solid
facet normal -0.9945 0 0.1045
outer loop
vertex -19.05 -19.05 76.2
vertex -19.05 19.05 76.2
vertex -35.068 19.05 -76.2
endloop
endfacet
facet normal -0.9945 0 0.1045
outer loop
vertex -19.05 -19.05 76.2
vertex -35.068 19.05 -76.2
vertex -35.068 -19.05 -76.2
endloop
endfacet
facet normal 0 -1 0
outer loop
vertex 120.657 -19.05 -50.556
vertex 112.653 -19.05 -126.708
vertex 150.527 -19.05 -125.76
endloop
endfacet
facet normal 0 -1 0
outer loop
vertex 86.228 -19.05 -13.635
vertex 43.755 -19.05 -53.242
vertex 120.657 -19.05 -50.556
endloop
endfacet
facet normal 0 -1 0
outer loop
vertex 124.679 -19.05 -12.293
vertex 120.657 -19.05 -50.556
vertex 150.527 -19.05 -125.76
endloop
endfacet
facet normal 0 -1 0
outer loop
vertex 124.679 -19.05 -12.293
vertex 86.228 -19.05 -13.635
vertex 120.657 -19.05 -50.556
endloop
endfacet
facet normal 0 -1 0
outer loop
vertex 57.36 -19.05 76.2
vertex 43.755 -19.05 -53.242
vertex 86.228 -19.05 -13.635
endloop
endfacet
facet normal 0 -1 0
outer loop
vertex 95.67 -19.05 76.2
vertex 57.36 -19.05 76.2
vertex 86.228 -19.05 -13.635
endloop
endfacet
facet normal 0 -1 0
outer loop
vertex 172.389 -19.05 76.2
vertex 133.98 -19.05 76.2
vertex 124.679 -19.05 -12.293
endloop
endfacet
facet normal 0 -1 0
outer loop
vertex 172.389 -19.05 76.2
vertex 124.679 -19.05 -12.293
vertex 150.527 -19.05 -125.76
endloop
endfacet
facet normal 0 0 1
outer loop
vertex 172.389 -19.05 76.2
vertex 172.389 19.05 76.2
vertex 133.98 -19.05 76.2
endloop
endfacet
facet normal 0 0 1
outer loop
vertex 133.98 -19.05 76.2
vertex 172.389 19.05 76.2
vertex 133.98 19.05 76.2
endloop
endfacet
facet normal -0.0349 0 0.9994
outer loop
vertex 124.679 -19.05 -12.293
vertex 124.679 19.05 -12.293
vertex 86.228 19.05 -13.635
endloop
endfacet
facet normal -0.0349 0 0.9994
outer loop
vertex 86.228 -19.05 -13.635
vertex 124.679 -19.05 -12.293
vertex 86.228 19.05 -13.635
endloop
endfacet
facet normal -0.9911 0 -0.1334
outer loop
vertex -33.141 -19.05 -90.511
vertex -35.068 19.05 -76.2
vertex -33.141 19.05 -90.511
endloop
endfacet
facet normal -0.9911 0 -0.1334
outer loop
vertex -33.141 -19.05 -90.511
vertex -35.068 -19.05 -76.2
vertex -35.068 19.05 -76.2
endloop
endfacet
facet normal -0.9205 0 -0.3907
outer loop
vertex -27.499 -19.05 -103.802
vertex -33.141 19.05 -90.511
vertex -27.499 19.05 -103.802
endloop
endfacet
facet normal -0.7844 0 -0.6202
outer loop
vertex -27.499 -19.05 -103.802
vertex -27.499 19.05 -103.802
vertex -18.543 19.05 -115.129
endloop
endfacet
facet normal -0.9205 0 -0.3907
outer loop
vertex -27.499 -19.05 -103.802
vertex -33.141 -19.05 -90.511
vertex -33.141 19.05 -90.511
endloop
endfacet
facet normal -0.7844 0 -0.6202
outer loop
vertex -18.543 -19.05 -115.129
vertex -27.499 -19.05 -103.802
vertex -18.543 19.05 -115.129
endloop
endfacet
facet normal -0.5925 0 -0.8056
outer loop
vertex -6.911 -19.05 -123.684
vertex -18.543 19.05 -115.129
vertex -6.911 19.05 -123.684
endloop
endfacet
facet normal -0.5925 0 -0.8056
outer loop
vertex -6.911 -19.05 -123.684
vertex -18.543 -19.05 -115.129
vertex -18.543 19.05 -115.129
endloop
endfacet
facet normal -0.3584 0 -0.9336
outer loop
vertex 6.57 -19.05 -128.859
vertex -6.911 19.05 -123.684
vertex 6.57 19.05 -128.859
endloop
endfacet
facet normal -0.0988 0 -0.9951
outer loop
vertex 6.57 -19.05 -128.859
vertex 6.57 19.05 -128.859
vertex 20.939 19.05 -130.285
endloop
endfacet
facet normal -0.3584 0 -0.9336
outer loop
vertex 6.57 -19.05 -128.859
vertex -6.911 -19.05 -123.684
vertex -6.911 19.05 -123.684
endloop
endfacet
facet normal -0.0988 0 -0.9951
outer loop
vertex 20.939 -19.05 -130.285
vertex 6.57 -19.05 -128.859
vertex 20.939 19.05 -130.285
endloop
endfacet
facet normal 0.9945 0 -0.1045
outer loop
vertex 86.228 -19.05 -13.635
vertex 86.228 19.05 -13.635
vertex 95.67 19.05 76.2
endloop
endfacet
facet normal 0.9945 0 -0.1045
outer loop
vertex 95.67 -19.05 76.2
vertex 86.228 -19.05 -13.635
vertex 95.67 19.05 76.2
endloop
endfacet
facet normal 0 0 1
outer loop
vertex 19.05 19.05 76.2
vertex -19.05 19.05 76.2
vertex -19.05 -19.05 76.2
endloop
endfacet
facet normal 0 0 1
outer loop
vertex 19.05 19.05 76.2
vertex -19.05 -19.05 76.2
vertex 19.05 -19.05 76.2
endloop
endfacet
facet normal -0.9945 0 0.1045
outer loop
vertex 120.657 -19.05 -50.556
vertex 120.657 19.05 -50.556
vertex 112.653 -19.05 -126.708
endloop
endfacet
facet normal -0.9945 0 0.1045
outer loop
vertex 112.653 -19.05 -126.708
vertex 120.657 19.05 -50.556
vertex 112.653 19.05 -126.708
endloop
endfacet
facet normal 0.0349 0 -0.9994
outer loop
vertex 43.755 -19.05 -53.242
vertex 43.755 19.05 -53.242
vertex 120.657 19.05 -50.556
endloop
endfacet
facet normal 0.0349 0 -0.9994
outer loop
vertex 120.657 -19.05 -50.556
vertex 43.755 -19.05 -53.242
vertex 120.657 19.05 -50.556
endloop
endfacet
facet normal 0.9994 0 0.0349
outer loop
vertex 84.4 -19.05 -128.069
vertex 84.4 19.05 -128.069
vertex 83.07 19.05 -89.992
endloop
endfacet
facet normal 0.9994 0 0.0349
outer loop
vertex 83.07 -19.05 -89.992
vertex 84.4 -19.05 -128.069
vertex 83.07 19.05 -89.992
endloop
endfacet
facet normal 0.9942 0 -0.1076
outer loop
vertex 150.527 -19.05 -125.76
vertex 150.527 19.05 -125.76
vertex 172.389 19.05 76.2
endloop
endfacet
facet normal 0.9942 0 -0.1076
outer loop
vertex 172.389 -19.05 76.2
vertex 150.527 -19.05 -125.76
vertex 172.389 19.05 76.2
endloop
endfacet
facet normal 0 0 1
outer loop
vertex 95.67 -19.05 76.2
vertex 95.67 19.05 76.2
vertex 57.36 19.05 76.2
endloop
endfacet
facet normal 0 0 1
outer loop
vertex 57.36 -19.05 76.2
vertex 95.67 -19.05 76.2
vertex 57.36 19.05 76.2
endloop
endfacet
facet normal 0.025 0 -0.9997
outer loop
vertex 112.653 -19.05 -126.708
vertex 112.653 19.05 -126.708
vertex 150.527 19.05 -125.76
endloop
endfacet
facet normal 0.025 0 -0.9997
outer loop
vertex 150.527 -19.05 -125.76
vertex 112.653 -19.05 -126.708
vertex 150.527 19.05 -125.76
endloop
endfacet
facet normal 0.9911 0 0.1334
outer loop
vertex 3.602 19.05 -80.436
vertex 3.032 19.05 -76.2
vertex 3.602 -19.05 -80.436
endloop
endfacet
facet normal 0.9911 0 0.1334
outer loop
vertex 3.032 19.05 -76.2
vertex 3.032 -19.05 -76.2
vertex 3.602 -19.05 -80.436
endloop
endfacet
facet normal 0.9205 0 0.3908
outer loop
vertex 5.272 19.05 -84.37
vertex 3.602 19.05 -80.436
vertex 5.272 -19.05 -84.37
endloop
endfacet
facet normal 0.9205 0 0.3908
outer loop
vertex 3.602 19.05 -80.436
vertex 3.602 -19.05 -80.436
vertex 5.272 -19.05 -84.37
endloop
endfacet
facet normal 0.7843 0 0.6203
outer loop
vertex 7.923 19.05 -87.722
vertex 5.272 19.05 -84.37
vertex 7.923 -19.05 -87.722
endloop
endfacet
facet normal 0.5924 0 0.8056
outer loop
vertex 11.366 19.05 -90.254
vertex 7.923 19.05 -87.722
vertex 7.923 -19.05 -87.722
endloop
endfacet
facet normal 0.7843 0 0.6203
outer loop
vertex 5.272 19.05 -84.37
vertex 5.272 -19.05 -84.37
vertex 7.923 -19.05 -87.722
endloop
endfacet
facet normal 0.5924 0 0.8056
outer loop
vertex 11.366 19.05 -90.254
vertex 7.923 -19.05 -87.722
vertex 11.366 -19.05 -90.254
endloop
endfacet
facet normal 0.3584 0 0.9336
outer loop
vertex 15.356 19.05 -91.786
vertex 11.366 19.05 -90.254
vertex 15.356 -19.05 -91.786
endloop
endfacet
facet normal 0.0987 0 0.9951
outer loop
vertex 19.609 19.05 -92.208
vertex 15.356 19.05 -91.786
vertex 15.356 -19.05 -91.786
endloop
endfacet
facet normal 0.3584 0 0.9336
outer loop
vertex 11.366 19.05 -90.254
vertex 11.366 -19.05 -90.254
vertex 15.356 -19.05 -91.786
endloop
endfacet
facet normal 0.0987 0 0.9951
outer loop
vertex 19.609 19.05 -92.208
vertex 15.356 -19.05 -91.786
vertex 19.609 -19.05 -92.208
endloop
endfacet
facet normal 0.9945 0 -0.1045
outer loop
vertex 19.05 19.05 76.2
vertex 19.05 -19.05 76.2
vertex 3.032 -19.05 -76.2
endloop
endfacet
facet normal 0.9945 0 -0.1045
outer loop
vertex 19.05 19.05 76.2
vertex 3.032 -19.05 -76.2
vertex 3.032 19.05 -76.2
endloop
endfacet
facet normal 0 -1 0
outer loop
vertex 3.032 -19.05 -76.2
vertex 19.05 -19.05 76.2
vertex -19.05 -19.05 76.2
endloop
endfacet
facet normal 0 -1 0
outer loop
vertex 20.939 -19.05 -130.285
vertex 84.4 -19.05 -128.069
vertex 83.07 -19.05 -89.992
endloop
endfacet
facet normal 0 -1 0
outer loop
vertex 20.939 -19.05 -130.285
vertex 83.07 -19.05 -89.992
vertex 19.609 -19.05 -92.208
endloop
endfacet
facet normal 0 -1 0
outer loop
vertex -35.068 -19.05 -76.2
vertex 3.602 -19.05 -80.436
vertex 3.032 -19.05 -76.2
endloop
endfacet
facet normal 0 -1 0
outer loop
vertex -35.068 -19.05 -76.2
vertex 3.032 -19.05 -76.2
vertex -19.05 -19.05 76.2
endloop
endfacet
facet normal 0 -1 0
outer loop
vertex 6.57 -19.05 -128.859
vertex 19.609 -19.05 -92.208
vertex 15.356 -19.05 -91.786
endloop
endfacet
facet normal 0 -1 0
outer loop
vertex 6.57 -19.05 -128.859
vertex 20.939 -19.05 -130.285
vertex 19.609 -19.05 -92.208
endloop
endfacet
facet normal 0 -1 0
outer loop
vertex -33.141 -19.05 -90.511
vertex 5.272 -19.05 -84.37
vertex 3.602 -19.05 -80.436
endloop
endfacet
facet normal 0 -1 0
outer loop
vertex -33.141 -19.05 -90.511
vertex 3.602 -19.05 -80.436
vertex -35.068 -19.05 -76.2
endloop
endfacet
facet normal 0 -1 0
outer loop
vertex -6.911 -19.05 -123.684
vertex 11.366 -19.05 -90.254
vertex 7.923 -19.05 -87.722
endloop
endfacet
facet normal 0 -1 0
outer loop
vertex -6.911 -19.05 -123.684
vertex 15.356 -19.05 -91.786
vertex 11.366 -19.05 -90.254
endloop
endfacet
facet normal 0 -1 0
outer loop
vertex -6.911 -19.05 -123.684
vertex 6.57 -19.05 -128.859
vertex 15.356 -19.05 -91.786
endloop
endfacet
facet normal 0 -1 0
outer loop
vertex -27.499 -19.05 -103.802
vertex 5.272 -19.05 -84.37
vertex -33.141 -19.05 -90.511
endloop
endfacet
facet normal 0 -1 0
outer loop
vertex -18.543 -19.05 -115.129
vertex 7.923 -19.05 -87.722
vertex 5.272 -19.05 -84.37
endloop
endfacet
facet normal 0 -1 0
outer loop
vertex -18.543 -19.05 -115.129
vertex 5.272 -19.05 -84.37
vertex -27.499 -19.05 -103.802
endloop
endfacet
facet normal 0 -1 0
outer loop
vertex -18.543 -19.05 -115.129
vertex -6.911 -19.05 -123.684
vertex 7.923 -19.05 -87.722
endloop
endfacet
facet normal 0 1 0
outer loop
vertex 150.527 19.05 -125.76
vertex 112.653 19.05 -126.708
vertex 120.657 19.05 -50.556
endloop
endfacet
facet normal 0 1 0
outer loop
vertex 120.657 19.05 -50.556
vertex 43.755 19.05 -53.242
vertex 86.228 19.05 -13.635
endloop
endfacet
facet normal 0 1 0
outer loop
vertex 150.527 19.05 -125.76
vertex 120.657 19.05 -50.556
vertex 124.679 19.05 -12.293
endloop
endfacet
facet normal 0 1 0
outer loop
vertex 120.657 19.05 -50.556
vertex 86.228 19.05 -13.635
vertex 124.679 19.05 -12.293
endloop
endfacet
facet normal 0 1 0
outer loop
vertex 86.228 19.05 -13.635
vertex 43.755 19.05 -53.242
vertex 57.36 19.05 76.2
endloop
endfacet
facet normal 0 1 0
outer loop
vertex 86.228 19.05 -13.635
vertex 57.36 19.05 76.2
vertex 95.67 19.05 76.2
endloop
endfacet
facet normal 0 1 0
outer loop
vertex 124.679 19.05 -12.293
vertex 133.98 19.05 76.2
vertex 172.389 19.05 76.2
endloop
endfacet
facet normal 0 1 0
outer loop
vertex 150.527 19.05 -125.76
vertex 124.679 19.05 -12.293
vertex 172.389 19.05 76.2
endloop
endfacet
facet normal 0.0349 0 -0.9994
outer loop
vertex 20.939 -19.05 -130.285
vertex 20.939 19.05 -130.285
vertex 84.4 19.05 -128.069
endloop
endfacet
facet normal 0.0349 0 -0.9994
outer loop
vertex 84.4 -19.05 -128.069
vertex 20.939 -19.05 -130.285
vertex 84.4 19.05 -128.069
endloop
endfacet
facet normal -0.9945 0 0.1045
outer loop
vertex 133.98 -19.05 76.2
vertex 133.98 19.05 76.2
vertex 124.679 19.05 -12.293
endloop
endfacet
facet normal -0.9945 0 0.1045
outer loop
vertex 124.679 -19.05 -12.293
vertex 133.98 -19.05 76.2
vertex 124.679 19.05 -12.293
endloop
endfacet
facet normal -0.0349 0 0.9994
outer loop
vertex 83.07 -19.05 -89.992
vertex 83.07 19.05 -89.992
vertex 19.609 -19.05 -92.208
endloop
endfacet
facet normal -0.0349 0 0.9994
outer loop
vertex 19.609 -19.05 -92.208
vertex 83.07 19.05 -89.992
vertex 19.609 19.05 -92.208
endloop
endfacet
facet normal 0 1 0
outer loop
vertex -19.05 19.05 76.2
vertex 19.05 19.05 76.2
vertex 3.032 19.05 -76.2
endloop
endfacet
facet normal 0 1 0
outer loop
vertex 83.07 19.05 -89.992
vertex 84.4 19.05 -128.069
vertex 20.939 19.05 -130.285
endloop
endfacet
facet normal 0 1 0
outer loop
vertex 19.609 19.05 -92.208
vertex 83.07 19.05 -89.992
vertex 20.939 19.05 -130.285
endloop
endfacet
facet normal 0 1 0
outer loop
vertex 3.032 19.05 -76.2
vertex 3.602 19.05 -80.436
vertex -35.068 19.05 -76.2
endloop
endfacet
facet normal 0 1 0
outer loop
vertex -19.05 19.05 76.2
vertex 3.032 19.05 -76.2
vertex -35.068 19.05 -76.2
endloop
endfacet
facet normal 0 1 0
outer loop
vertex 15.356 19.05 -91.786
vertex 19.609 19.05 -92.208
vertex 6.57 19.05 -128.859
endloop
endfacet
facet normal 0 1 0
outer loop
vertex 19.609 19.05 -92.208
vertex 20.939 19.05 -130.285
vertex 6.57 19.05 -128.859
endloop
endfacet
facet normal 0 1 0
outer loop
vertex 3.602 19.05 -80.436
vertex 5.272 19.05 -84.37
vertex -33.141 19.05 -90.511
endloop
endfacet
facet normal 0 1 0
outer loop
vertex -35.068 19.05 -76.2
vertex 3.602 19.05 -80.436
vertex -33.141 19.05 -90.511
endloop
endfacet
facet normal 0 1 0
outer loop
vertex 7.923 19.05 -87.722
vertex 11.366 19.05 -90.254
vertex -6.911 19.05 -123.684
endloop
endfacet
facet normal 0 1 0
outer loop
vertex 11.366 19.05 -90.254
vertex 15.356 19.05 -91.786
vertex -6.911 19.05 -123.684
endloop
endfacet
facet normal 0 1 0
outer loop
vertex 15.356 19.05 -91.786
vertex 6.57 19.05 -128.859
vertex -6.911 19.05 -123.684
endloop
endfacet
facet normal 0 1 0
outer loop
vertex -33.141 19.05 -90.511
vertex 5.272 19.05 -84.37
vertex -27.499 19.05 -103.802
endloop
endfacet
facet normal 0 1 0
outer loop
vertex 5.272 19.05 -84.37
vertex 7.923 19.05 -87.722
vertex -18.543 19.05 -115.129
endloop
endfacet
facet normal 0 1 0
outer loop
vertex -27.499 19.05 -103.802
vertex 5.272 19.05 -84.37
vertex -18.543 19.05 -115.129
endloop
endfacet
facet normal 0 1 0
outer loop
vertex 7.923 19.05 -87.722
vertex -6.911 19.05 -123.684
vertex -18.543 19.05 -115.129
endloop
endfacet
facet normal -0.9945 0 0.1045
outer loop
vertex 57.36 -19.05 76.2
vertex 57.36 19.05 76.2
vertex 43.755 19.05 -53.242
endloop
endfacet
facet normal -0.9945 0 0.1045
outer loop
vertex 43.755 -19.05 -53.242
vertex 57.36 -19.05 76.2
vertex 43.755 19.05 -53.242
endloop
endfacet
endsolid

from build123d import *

# Parameters (mm, degrees)
F2_W      = 38.1
F2_H      = 38.1
F3_FACE_W = 38.1
F3_FACE_H = 38.1
F6_ANGLE  = 92
F10_DEPTH = 38.1


# Not quite as in the source:
# - a feature of the source that left no trace in its solid (it failed there, or was rolled back) is left out


with BuildPart() as f3:
    # F3: sweep along a path in F1
    with BuildLine(Plane.XZ) as f3_path:
        Line((0, 76.2), (-16.0178854545, -76.2))
    # F2 (on offset) → F3 (sweep)
    with BuildSketch(Plane.XY.offset(76.2)):
        Rectangle(F2_W, F2_H)
    sweep(path=f3_path.line)

    # F3_face (on face) → F6 (revolve)
    with BuildSketch(Plane(origin=(-16.0178854545, 0, -76.2), x_dir=(1, 0, 0), z_dir=(0, 0, -1))):
        Rectangle(F3_FACE_W, F3_FACE_H)
    revolve(axis=Axis((19.05, 0, -76.2), (0, -1, 0)), revolution_arc=F6_ANGLE)

    # F9 (on offset) → F10 (join)
    with BuildSketch(Plane.XZ.offset(-19.05)):
        with BuildLine():
            Line((19.05, 76.2), (-19.05, 76.2))
            Line((-19.05, 76.2), (-35.0678854545, -76.2))
            ThreePointArc((-35.0678854545, -76.2), (-18.5434421225, -115.1291489176), (20.938686965, -130.2849183009))
            Line((20.938686965, -130.2849183009), (84.4000044807, -128.0688002603))
            Line((84.4000044807, -128.0688002603), (83.0703336563, -89.9920097509))
            Line((83.0703336563, -89.9920097509), (19.6090161406, -92.2081277915))
            ThreePointArc((19.6090161406, -92.2081277915), (7.923041792, -87.7223025247), (3.0321145455, -76.2))
            Line((3.0321145455, -76.2), (19.05, 76.2))
        make_face()
    extrude(amount=F10_DEPTH)


with BuildPart() as f10:
    # F9 (on offset) → F10, piece 2 (new body)
    with BuildSketch(Plane.XZ.offset(-19.05)):
        Polygon((57.3598628922, 76.1999756512), (48.2847232605, -10.1442102778), (43.7549937167, -53.2417080366), (120.6569795756, -50.556231515), (112.6531418084, -126.7076610645), (150.5274446174, -125.7595791662), (172.3890340576, 76.2), (133.9795978448, 76.2000141826), (124.6786526722, -12.292567958), (86.2276597428, -13.6353062188), (95.6697283436, 76.1999756512), align=None)
    extrude(amount=F10_DEPTH)


solid = Compound([f3.part, f10.part])
